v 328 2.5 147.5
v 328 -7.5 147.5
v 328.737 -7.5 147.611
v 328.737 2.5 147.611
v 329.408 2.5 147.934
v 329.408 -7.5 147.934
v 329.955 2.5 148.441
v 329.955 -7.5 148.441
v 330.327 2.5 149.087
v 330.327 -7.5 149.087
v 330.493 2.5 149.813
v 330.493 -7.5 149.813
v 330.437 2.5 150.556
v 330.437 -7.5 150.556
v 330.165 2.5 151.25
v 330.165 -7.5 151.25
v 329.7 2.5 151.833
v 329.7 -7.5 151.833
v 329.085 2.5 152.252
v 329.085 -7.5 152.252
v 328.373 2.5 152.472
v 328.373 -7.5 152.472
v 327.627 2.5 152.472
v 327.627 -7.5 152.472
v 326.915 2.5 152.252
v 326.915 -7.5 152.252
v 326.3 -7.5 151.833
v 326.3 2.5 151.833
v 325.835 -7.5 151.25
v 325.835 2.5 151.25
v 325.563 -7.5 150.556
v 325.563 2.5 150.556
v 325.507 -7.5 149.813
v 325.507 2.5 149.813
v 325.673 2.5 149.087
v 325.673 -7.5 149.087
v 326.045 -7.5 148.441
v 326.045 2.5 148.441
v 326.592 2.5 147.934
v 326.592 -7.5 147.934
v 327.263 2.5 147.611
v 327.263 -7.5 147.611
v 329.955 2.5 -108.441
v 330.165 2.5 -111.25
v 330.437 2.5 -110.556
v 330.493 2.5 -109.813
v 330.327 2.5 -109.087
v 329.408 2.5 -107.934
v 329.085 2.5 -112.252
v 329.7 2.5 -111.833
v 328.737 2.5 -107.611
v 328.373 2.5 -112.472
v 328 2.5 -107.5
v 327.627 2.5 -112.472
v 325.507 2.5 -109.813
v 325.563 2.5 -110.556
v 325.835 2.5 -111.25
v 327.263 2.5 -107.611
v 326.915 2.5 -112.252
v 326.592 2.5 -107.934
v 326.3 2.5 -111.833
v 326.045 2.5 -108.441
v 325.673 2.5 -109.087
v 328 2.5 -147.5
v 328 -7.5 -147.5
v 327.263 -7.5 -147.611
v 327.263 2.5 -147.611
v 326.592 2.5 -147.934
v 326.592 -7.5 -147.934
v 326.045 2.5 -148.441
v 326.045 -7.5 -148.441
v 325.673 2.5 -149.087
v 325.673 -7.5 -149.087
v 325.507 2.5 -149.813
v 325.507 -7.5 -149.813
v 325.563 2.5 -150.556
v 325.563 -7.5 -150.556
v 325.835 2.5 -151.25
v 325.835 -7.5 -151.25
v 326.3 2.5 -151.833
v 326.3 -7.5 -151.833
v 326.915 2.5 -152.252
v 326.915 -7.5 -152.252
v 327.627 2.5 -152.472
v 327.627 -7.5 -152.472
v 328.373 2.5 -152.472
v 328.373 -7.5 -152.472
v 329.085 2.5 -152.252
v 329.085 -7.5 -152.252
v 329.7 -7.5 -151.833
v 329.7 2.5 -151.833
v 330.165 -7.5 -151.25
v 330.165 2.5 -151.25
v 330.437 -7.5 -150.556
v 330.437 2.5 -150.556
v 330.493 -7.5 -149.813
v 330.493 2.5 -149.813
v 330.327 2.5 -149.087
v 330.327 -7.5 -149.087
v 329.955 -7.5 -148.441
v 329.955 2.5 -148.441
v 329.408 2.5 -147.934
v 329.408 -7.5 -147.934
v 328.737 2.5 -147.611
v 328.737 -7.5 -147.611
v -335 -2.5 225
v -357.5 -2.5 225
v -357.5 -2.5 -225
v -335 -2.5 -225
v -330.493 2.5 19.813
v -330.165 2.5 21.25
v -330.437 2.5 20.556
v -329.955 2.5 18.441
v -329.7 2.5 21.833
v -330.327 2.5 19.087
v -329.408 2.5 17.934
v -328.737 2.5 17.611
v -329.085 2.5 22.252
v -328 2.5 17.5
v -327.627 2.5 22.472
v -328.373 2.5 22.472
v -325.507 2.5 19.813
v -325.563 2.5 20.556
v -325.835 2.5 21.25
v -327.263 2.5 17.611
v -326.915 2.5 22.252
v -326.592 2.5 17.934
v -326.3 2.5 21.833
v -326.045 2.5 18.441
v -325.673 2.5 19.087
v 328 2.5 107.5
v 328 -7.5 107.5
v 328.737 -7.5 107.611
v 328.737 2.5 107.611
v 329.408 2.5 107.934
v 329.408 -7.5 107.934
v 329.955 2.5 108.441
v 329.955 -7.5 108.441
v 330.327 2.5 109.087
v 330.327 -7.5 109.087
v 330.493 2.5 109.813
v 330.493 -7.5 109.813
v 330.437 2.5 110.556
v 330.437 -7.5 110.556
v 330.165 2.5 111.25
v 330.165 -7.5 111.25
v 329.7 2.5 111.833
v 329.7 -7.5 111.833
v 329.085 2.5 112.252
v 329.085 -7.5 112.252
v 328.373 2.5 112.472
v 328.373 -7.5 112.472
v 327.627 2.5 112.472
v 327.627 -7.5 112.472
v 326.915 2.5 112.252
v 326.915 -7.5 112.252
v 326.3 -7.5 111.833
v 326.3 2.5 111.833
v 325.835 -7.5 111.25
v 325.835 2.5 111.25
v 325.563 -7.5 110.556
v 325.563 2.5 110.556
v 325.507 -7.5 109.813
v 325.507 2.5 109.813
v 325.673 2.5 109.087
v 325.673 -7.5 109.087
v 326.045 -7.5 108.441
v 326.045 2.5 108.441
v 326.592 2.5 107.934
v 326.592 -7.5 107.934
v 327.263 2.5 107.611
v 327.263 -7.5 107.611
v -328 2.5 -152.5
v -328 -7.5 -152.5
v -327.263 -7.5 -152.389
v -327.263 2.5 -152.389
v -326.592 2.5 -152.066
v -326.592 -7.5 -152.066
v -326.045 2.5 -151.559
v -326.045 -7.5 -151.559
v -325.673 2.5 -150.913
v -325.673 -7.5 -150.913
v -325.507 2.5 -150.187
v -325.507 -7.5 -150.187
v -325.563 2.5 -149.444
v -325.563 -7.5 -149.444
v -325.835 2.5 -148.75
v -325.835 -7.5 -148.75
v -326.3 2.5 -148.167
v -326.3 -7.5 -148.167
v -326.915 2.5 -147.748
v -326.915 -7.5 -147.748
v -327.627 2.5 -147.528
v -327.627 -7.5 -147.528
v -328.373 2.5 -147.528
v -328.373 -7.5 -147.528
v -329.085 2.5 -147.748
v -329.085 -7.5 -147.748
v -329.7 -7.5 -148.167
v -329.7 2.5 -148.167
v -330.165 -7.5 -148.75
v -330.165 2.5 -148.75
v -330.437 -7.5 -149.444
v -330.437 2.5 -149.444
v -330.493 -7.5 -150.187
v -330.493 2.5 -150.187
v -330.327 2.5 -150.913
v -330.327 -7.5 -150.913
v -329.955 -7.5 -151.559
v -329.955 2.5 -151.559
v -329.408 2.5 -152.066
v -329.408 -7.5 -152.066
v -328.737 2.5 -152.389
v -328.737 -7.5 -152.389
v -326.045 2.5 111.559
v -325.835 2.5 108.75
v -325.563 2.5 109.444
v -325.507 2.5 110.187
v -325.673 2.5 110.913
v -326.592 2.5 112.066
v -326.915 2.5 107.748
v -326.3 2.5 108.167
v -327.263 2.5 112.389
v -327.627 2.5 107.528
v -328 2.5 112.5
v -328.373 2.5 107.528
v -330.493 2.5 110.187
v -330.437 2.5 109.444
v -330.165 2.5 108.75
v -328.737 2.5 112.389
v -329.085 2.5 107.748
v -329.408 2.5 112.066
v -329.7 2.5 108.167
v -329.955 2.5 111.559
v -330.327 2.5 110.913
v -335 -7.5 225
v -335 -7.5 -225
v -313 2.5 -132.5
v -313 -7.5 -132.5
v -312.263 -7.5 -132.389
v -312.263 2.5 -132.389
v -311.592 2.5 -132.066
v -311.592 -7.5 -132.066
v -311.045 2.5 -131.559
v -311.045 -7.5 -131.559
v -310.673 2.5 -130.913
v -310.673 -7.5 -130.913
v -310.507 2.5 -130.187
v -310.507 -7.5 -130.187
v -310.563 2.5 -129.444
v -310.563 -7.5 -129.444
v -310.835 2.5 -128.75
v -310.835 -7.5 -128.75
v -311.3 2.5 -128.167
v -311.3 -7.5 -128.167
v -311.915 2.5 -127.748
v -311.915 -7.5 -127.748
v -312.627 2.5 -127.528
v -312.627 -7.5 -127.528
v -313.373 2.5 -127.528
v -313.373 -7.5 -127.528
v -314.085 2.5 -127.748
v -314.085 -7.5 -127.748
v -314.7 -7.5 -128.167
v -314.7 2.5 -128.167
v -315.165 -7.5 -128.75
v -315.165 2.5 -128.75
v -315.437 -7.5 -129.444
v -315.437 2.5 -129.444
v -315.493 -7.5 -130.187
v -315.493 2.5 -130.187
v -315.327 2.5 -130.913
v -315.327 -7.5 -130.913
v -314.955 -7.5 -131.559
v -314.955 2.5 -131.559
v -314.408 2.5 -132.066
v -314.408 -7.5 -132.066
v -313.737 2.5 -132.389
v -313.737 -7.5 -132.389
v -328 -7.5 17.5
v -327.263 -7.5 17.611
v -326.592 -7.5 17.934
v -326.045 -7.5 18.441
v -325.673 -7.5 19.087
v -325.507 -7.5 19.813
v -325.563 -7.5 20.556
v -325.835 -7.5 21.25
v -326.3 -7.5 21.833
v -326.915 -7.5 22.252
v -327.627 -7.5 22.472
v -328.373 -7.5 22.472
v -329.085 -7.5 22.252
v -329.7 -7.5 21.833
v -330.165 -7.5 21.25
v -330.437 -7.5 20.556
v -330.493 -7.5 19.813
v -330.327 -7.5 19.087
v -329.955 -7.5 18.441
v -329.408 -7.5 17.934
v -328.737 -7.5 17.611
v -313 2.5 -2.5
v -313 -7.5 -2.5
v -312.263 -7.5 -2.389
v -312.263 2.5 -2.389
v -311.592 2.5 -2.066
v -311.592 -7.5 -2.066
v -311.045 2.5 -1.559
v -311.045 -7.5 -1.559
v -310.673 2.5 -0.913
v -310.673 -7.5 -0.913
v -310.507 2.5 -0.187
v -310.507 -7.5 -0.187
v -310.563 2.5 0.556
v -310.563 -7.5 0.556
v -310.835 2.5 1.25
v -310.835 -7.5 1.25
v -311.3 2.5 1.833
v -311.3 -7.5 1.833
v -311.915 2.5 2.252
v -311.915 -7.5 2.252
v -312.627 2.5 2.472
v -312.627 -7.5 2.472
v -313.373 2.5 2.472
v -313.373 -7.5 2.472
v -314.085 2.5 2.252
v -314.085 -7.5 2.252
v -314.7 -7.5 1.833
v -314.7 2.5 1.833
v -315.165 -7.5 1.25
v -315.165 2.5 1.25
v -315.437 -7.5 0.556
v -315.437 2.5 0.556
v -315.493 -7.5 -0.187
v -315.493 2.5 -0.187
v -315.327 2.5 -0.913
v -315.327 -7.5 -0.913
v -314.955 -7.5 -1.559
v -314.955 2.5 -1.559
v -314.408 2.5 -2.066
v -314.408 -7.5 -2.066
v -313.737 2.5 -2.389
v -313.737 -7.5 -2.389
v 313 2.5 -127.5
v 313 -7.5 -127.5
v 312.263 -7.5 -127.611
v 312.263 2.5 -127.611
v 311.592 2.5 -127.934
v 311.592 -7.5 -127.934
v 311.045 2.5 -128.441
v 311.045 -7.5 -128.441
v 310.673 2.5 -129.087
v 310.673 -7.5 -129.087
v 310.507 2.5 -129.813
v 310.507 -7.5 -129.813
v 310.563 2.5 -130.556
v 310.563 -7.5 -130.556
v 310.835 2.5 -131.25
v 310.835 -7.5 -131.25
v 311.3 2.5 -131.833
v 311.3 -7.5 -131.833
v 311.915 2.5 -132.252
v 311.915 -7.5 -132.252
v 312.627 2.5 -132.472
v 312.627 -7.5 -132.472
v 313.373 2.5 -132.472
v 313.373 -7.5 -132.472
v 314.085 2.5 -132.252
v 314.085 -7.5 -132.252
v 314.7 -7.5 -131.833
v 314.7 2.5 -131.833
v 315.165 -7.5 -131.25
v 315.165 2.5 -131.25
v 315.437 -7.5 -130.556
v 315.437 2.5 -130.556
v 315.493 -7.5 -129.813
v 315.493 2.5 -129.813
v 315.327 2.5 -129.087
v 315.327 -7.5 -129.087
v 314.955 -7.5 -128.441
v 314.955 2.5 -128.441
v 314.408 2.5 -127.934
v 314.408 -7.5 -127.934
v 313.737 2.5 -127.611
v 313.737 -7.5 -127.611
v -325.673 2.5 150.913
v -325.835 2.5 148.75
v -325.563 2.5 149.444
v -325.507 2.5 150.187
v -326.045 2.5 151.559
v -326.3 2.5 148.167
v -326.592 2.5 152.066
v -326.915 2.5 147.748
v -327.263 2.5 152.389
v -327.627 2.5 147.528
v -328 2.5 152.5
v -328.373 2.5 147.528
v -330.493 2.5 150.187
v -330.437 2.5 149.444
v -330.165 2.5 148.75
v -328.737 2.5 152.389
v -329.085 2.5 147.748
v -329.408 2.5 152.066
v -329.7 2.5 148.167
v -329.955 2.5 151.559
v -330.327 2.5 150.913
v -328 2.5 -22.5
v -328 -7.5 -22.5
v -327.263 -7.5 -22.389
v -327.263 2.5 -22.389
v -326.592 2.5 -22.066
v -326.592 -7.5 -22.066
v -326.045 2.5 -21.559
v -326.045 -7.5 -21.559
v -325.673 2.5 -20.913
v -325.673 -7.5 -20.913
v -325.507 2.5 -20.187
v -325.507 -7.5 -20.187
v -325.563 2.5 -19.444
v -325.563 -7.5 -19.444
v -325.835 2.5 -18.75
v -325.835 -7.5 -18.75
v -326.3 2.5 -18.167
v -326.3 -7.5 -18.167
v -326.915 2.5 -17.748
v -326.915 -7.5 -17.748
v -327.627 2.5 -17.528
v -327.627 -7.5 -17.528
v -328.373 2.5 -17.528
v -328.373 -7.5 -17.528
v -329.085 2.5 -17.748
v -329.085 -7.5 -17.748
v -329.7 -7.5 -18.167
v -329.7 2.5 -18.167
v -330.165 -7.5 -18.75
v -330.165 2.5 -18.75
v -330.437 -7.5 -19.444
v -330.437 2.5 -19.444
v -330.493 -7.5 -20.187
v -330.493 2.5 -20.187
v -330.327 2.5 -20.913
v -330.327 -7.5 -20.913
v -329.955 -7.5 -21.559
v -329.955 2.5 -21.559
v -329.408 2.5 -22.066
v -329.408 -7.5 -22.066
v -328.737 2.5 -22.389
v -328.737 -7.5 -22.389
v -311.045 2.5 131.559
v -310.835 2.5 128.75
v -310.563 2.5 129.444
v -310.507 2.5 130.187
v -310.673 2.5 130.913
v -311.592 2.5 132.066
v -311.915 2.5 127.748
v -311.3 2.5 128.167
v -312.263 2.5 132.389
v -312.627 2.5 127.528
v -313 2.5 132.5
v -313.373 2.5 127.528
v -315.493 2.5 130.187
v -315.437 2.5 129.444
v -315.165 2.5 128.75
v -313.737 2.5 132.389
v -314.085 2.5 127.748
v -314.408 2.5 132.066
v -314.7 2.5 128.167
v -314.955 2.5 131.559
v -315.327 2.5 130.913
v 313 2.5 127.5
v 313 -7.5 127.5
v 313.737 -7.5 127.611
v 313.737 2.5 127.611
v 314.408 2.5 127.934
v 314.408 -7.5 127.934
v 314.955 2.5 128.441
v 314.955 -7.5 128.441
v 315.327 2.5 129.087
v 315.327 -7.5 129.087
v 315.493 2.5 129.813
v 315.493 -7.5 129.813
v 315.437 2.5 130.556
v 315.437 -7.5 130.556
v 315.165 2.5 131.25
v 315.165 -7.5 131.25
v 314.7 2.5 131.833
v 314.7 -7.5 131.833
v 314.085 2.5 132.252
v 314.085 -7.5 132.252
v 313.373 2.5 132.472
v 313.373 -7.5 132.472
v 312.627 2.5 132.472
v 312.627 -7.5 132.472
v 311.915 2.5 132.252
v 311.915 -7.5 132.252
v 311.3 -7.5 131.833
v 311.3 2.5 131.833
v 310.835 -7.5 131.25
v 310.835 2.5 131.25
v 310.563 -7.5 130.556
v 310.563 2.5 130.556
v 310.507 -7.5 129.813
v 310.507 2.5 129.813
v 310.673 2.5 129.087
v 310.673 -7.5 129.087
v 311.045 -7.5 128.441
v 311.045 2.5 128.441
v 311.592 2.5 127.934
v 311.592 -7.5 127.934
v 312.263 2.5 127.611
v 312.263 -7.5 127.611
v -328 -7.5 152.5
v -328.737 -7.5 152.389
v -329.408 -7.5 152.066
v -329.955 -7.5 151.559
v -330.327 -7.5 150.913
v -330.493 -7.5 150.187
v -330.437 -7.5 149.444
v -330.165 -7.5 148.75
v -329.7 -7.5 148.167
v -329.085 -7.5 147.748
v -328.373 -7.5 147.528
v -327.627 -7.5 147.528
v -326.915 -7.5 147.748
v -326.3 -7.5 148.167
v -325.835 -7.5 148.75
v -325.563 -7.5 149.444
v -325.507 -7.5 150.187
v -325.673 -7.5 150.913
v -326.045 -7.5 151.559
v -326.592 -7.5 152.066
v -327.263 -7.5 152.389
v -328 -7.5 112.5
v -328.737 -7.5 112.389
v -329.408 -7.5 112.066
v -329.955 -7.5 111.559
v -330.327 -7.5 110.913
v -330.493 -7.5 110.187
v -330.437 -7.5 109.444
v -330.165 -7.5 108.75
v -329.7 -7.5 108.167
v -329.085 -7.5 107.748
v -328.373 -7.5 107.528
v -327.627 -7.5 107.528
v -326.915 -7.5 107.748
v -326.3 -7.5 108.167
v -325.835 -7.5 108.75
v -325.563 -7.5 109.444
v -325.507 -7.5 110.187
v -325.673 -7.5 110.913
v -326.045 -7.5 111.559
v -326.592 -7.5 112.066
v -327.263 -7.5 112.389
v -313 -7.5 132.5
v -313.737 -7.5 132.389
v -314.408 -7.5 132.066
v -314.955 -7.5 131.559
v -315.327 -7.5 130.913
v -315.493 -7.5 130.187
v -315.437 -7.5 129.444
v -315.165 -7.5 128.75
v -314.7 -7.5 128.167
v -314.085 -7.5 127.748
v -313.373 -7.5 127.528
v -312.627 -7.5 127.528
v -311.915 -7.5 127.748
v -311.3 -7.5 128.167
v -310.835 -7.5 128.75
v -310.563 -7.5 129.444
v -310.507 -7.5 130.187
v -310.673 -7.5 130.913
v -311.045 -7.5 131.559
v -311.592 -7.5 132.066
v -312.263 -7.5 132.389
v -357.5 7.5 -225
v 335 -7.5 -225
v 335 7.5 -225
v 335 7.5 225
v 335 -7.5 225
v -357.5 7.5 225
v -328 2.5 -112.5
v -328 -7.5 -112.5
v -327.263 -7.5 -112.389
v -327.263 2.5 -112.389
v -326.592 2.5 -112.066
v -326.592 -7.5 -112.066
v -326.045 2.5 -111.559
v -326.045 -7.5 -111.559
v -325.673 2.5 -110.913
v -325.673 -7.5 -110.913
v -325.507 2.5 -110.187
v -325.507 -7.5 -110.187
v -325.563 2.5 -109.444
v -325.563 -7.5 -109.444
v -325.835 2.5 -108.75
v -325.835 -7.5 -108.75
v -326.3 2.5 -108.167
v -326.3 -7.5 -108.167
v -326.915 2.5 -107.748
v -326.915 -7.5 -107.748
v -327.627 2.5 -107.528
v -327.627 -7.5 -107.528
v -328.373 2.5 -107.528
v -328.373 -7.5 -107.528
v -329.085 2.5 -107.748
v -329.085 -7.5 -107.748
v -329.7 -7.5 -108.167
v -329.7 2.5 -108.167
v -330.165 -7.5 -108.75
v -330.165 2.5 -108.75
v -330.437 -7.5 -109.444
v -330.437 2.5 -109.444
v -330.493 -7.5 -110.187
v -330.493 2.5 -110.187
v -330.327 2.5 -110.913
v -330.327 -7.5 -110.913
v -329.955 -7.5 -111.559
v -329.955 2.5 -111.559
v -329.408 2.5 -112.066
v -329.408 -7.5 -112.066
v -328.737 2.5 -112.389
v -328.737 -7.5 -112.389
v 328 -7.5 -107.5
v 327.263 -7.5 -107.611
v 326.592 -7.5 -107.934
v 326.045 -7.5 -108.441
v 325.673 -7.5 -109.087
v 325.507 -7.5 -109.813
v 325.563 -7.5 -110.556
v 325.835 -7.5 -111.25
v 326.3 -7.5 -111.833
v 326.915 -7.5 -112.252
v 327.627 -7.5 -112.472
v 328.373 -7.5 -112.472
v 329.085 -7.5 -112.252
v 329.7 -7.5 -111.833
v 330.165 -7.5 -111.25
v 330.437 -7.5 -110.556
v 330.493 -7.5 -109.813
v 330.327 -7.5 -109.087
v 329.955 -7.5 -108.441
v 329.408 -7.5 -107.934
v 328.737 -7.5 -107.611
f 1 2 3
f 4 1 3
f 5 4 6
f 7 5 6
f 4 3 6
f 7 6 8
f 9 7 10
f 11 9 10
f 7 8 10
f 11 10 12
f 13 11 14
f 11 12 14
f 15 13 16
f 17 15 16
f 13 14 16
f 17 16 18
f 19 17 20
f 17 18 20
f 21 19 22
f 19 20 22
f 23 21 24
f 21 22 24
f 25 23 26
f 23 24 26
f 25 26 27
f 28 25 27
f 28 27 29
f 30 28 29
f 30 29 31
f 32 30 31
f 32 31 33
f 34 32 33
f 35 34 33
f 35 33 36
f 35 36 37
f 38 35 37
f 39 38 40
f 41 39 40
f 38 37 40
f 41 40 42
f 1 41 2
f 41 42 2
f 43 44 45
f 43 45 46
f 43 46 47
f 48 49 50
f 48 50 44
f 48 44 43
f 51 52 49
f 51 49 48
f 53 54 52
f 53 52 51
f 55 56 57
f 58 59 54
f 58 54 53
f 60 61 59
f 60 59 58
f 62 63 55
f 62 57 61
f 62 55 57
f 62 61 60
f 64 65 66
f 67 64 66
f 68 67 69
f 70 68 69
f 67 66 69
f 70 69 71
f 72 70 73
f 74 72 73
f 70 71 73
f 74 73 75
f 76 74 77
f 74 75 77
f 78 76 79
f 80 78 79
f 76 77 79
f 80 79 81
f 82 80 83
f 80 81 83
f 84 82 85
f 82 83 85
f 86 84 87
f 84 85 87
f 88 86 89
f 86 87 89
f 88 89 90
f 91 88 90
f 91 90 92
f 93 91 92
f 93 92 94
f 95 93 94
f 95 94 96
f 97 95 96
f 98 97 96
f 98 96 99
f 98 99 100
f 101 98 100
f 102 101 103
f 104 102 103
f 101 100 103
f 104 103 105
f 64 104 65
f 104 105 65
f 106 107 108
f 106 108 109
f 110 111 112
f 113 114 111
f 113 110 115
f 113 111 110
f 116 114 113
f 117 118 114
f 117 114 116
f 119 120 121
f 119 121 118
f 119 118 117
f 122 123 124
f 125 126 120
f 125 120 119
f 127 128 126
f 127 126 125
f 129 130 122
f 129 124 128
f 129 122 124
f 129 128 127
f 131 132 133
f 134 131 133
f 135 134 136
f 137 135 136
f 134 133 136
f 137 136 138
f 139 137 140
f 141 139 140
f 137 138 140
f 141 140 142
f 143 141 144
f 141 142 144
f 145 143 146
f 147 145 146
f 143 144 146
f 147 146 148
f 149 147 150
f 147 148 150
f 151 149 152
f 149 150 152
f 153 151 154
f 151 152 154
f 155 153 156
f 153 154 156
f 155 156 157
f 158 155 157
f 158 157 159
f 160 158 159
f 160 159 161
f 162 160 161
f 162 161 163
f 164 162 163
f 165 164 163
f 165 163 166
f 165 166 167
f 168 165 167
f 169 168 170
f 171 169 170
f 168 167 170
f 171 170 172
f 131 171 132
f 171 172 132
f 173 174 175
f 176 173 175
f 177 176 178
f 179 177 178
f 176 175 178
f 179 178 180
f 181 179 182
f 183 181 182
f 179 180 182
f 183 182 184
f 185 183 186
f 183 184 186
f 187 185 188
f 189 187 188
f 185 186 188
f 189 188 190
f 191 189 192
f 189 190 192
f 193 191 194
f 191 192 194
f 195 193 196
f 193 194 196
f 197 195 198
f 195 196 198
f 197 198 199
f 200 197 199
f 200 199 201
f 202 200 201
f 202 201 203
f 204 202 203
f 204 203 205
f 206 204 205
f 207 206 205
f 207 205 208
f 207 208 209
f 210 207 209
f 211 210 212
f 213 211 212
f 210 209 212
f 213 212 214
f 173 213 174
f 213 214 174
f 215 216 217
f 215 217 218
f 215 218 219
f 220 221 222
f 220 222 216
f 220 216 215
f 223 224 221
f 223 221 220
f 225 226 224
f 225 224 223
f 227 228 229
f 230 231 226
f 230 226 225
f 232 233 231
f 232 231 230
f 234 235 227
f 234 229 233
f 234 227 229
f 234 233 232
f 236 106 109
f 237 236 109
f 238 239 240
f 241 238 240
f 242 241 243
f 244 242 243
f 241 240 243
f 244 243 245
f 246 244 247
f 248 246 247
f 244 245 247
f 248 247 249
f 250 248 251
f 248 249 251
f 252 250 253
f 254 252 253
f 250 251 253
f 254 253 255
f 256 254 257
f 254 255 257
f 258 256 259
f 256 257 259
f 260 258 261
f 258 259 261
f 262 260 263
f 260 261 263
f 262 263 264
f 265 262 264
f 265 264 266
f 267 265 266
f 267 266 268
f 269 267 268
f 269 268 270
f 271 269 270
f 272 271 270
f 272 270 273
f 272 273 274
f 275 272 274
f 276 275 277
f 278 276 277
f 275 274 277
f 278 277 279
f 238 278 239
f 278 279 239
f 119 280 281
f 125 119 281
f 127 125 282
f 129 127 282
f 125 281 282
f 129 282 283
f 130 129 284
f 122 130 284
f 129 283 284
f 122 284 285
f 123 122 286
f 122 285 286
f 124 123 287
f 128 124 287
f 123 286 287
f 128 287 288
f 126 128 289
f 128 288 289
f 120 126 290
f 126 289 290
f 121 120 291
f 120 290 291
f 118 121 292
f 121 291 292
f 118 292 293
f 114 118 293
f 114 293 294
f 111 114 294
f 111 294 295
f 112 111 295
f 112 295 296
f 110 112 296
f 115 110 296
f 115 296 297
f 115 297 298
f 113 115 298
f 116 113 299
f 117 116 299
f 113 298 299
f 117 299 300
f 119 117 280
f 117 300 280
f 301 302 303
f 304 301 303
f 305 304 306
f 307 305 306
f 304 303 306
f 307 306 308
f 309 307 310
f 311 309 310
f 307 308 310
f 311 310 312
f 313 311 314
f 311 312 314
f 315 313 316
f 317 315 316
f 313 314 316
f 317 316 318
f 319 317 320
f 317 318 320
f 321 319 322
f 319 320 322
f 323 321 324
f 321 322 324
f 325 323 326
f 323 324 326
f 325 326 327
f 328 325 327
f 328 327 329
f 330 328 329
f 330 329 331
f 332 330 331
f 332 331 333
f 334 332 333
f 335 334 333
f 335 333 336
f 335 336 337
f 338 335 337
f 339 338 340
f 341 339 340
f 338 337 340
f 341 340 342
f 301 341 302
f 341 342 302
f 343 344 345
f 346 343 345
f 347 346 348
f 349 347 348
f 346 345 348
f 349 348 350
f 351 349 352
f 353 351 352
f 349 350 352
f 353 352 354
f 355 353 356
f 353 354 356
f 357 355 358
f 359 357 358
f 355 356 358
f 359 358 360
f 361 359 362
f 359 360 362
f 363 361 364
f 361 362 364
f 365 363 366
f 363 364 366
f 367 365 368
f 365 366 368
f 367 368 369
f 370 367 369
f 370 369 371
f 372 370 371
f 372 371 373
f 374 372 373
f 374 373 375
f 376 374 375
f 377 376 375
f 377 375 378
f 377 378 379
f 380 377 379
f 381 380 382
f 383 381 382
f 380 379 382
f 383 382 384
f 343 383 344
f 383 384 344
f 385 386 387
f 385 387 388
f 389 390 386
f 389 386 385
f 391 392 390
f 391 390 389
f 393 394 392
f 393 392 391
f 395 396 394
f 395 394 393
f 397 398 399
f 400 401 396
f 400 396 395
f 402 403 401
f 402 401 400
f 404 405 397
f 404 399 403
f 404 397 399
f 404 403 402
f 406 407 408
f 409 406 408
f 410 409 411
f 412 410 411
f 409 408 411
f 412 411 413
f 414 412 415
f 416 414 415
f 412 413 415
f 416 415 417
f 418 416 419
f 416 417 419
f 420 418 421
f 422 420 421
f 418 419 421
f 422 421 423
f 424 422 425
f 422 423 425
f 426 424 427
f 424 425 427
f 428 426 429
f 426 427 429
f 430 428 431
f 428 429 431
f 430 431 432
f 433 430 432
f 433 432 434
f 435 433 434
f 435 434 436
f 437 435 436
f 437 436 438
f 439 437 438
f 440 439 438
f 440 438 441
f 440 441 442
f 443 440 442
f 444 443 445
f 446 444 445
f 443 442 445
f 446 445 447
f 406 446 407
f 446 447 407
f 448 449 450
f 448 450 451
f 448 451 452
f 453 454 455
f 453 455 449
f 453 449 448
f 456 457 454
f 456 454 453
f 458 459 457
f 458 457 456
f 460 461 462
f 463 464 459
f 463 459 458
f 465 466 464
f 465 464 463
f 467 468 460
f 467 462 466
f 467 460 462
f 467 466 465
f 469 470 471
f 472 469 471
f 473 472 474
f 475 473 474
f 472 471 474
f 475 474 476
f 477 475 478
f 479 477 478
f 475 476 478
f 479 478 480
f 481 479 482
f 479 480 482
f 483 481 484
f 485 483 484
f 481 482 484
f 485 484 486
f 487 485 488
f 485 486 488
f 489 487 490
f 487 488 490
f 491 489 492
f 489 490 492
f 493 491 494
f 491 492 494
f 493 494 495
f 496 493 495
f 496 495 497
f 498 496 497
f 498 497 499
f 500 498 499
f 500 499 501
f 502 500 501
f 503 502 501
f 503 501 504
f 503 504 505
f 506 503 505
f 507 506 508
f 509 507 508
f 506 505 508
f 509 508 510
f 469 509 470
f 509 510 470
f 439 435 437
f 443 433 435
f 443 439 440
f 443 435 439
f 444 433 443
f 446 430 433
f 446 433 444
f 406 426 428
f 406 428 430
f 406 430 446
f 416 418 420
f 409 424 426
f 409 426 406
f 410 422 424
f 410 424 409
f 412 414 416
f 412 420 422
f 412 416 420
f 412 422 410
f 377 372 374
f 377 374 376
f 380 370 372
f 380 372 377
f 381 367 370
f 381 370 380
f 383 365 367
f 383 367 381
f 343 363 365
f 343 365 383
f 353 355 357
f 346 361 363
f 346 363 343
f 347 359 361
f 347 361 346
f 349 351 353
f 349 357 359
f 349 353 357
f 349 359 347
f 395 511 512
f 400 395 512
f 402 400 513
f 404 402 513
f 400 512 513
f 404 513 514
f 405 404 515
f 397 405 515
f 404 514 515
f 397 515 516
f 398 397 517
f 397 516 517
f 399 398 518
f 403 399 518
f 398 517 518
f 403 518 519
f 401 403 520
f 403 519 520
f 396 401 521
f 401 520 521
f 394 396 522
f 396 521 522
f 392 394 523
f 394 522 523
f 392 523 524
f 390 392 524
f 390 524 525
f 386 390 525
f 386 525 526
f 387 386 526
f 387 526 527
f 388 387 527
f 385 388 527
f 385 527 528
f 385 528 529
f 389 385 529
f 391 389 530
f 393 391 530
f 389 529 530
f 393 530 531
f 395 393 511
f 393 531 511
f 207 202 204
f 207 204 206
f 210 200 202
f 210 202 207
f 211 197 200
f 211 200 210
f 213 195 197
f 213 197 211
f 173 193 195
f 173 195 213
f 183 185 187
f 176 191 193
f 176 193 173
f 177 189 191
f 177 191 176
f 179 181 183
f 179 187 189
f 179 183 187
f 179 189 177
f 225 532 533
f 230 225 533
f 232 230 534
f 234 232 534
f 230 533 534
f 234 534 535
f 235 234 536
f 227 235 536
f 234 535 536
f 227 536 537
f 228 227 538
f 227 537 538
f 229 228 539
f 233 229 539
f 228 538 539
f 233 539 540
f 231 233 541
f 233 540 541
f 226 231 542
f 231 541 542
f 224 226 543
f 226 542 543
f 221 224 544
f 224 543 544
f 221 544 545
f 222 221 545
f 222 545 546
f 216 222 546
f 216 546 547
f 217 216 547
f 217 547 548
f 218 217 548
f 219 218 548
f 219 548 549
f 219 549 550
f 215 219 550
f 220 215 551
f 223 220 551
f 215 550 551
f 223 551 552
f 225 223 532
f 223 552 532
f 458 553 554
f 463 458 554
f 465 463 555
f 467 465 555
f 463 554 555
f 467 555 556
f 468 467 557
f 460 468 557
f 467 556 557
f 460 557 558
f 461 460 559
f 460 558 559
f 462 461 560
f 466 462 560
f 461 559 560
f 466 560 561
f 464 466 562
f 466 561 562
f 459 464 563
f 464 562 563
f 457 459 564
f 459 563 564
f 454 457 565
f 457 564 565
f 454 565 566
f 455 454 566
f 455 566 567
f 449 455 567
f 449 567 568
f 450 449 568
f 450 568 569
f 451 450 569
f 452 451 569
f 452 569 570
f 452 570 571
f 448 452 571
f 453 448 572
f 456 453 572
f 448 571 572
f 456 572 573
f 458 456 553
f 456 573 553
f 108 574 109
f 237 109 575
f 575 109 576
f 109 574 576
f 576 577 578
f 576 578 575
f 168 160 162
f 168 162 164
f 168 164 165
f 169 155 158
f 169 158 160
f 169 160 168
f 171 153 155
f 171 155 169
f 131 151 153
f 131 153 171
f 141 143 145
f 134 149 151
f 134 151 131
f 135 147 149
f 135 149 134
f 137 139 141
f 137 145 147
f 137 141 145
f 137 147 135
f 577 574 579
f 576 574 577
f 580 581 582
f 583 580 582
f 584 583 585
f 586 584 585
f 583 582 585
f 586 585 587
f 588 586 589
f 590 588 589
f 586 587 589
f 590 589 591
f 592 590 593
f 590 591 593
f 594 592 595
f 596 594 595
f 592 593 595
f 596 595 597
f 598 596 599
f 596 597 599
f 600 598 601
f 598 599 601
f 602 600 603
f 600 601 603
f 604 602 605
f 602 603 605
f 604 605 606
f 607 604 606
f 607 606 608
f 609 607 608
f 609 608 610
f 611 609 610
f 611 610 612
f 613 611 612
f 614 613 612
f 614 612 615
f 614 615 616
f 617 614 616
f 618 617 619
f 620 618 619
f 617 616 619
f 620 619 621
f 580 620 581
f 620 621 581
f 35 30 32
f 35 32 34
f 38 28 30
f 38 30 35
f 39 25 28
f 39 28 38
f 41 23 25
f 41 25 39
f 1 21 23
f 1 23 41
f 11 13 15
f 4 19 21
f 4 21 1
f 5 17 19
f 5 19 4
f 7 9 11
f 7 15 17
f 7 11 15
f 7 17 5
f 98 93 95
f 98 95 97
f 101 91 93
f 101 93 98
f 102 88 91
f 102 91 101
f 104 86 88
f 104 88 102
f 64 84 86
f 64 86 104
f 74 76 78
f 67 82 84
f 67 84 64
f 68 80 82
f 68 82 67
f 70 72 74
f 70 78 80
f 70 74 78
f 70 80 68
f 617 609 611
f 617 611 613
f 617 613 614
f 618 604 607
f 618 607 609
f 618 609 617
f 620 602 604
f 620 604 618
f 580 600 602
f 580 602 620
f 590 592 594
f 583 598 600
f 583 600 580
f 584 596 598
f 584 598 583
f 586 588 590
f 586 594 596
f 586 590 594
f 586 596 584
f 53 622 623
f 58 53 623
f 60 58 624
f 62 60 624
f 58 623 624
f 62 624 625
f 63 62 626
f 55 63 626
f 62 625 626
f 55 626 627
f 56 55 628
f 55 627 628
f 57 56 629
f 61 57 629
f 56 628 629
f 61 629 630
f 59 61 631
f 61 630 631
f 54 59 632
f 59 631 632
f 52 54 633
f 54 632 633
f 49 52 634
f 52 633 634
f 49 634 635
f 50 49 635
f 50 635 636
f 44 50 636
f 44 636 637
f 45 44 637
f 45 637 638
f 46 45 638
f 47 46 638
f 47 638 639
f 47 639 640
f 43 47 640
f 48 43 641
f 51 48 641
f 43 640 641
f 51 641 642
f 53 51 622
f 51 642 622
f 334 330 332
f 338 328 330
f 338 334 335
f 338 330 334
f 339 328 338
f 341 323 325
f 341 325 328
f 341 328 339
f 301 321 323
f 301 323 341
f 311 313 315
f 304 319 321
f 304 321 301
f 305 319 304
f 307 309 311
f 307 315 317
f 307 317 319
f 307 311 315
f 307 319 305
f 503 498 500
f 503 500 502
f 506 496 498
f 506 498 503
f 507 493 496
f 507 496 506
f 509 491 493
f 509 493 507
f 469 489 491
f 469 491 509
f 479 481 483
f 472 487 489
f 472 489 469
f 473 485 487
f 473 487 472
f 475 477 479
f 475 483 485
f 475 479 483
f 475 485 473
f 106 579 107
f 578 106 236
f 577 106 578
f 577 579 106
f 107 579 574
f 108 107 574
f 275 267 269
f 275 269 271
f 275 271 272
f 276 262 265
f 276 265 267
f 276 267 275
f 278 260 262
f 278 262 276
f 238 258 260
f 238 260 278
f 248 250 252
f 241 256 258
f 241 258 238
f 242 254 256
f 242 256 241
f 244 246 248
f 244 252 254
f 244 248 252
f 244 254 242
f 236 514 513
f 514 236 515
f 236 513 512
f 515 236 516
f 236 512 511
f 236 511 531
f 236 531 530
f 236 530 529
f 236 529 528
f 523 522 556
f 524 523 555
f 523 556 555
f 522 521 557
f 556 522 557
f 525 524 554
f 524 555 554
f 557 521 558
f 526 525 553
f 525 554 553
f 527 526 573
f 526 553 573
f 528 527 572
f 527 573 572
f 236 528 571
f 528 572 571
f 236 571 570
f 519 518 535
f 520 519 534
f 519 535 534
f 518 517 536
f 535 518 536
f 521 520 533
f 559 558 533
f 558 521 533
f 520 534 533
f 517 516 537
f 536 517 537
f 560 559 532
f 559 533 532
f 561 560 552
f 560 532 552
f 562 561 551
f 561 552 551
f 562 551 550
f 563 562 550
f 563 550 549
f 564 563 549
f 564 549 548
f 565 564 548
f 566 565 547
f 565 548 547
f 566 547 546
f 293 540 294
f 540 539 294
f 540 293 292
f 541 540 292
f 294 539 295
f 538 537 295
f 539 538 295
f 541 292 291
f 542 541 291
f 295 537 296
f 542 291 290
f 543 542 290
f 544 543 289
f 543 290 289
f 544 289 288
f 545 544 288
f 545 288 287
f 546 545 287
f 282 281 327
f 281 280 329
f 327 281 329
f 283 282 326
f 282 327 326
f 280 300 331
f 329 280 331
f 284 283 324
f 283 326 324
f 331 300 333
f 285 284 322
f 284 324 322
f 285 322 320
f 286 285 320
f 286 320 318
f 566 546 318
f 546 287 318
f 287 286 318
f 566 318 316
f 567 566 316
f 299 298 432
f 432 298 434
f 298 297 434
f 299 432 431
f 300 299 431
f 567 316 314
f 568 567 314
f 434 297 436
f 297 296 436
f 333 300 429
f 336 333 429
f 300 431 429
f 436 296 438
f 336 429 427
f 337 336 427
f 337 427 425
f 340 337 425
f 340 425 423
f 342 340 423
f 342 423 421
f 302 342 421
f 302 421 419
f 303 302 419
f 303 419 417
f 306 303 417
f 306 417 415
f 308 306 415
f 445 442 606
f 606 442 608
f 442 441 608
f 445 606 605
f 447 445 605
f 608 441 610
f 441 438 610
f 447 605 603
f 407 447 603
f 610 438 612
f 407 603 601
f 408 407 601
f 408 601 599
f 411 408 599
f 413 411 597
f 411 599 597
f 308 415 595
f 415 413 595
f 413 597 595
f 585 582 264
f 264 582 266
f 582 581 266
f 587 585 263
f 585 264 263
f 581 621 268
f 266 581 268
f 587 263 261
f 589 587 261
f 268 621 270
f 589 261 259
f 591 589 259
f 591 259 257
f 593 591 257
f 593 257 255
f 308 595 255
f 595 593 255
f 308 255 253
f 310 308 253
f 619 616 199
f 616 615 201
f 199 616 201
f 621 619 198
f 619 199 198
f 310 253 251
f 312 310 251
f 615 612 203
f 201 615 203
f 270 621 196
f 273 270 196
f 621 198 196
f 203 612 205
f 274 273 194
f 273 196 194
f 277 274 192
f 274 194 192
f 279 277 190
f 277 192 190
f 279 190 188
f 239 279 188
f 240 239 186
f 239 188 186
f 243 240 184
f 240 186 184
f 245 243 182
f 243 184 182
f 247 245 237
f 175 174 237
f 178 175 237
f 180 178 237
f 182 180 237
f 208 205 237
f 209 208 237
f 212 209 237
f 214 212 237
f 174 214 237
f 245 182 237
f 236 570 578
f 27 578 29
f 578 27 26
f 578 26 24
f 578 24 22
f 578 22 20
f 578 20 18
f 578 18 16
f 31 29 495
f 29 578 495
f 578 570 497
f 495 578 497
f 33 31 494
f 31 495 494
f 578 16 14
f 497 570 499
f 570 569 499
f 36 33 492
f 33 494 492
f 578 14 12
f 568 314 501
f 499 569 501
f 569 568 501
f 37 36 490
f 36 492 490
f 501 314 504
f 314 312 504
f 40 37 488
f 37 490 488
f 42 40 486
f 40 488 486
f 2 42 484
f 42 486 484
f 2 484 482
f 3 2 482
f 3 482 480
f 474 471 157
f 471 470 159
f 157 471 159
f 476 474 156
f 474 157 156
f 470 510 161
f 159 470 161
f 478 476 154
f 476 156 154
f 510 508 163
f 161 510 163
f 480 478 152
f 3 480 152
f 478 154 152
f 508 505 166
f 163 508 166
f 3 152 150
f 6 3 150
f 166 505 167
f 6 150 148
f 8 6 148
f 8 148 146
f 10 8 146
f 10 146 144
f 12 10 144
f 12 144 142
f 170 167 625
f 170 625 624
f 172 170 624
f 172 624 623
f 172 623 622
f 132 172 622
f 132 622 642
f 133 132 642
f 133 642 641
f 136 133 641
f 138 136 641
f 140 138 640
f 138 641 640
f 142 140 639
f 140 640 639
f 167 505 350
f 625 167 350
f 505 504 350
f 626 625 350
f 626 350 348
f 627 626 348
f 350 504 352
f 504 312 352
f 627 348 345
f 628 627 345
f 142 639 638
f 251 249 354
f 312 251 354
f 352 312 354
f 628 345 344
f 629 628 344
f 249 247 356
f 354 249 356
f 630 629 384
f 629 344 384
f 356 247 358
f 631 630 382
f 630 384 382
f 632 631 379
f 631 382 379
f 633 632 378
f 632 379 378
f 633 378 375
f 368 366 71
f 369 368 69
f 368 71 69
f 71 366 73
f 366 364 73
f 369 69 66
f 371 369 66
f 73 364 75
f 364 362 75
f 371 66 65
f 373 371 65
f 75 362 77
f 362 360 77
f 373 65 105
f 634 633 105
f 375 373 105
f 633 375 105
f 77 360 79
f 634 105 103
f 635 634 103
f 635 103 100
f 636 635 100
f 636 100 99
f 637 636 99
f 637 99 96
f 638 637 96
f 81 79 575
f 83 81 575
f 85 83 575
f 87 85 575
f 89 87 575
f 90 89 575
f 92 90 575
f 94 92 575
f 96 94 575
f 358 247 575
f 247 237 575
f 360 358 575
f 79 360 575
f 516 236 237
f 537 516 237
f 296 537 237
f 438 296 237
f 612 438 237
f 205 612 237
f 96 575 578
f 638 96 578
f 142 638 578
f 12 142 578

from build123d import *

# Parameters (mm, degrees)
SKETCH1_W           = 670
SKETCH1_H           = 450
BOSS_EXTRUDE1_DEPTH = 7.5
SKETCH2_R           = 2.5
CUT_EXTRUDE1_DEPTH  = 10
SKETCH3_W           = 22.5
SKETCH3_H           = 450
BOSS_EXTRUDE2_DEPTH = 10
SKETCH4_R           = 2.5
CUT_EXTRUDE2_DEPTH  = 10


with BuildPart() as part:
    # Sketch1 → Boss-Extrude1 (new, symmetric)
    with BuildSketch(Plane(origin=(0, 0, 0), x_dir=(1, 0, 0), z_dir=(0, 1, 0))):
        Rectangle(SKETCH1_W, SKETCH1_H)
    extrude(amount=BOSS_EXTRUDE1_DEPTH, both=True)

    # Sketch2 → Cut-Extrude1 (cut)
    with BuildSketch(Plane.XZ.offset(7.5)):
        with Locations(Location((-328, -150, 0), (0, 0, 270))):
            Circle(SKETCH2_R)
        with Locations(Location((-328, -110, 0), (0, 0, 270))):
            Circle(SKETCH2_R)
        with Locations(Location((-313, -130, 0), (0, 0, 270))):
            Circle(SKETCH2_R)
        with Locations(Location((-328, 150, 0), (0, 0, 90))):
            Circle(SKETCH2_R)
        with Locations(Location((-313, 130, 0), (0, 0, 90))):
            Circle(SKETCH2_R)
        with Locations(Location((-328, 110, 0), (0, 0, 90))):
            Circle(SKETCH2_R)
        with Locations(Location((328, 150, 0), (0, 0, 270))):
            Circle(SKETCH2_R)
        with Locations(Location((328, 110, 0), (0, 0, 270))):
            Circle(SKETCH2_R)
        with Locations(Location((313, 130, 0), (0, 0, 270))):
            Circle(SKETCH2_R)
        with Locations(Location((328, -150, 0), (0, 0, 90))):
            Circle(SKETCH2_R)
        with Locations(Location((313, -130, 0), (0, 0, 90))):
            Circle(SKETCH2_R)
        with Locations(Location((328, -110, 0), (0, 0, 90))):
            Circle(SKETCH2_R)
    extrude(amount=-CUT_EXTRUDE1_DEPTH, mode=Mode.SUBTRACT)

    # Sketch3 → Boss-Extrude2 (add)
    with BuildSketch(Plane(origin=(0, 7.5, 0), x_dir=(1, 0, 0), z_dir=(0, 1, 0))):
        with Locations((-346.25, 0)):
            Rectangle(SKETCH3_W, SKETCH3_H)
    extrude(amount=-BOSS_EXTRUDE2_DEPTH)

    # Sketch4 → Cut-Extrude2 (cut)
    with BuildSketch(Plane(origin=(0, -7.5, 0), x_dir=(-1, 0, 0), z_dir=(0, -1, 0))):
        with Locations(Location((313, 0, 0), (0, 0, 90))):
            Circle(SKETCH4_R)
        with Locations(Location((328, -20, 0), (0, 0, 90))):
            Circle(SKETCH4_R)
        with Locations(Location((328, 20, 0), (0, 0, 90))):
            Circle(SKETCH4_R)
    extrude(amount=-CUT_EXTRUDE2_DEPTH, mode=Mode.SUBTRACT)


solid = part.part
